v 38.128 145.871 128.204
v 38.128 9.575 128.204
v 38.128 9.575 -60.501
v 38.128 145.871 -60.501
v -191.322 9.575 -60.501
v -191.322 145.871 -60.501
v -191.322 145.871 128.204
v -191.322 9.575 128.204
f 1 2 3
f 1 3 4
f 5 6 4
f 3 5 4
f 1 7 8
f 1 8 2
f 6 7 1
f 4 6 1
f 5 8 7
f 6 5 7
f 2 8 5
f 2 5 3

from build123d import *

# Parameters (mm, degrees)
F0_W     = 229.4497787952
F0_H     = 136.2964212894
F1_DEPTH = 25.4
F2_DEPTH = 102.8037015349
F3_DEPTH = 109.354019165
F4_DEPTH = 188.7048464268


with BuildPart() as f1:
    # F0 (on Top) → F1 (new body)
    with BuildSketch(Plane.XY):
        with Locations((-76.5966773033, 77.7228921652)):
            Rectangle(F0_W, F0_H)
    extrude(amount=F1_DEPTH)

    # F2 (add): a face of the model
    f2_faces = [f1.faces().sort_by_distance(p)[0] for p in [
        (-76.5966773033, 77.7228921652, 25.4),
    ]]
    extrude(f2_faces, amount=F2_DEPTH)

    # F3 (add): a face of the model
    f3_faces = [f1.faces().sort_by_distance(p)[0] for p in [
        (-76.5966773033, 77.7228921652, 128.2037015349),
    ]]
    extrude(f3_faces, amount=-F3_DEPTH)

    # F4 (add): a face of the model
    f4_faces = [f1.faces().sort_by_distance(p)[0] for p in [
        (-76.5966773033, 77.7228921652, 128.2037015349),
    ]]
    extrude(f4_faces, amount=-F4_DEPTH)


solid = f1.part
